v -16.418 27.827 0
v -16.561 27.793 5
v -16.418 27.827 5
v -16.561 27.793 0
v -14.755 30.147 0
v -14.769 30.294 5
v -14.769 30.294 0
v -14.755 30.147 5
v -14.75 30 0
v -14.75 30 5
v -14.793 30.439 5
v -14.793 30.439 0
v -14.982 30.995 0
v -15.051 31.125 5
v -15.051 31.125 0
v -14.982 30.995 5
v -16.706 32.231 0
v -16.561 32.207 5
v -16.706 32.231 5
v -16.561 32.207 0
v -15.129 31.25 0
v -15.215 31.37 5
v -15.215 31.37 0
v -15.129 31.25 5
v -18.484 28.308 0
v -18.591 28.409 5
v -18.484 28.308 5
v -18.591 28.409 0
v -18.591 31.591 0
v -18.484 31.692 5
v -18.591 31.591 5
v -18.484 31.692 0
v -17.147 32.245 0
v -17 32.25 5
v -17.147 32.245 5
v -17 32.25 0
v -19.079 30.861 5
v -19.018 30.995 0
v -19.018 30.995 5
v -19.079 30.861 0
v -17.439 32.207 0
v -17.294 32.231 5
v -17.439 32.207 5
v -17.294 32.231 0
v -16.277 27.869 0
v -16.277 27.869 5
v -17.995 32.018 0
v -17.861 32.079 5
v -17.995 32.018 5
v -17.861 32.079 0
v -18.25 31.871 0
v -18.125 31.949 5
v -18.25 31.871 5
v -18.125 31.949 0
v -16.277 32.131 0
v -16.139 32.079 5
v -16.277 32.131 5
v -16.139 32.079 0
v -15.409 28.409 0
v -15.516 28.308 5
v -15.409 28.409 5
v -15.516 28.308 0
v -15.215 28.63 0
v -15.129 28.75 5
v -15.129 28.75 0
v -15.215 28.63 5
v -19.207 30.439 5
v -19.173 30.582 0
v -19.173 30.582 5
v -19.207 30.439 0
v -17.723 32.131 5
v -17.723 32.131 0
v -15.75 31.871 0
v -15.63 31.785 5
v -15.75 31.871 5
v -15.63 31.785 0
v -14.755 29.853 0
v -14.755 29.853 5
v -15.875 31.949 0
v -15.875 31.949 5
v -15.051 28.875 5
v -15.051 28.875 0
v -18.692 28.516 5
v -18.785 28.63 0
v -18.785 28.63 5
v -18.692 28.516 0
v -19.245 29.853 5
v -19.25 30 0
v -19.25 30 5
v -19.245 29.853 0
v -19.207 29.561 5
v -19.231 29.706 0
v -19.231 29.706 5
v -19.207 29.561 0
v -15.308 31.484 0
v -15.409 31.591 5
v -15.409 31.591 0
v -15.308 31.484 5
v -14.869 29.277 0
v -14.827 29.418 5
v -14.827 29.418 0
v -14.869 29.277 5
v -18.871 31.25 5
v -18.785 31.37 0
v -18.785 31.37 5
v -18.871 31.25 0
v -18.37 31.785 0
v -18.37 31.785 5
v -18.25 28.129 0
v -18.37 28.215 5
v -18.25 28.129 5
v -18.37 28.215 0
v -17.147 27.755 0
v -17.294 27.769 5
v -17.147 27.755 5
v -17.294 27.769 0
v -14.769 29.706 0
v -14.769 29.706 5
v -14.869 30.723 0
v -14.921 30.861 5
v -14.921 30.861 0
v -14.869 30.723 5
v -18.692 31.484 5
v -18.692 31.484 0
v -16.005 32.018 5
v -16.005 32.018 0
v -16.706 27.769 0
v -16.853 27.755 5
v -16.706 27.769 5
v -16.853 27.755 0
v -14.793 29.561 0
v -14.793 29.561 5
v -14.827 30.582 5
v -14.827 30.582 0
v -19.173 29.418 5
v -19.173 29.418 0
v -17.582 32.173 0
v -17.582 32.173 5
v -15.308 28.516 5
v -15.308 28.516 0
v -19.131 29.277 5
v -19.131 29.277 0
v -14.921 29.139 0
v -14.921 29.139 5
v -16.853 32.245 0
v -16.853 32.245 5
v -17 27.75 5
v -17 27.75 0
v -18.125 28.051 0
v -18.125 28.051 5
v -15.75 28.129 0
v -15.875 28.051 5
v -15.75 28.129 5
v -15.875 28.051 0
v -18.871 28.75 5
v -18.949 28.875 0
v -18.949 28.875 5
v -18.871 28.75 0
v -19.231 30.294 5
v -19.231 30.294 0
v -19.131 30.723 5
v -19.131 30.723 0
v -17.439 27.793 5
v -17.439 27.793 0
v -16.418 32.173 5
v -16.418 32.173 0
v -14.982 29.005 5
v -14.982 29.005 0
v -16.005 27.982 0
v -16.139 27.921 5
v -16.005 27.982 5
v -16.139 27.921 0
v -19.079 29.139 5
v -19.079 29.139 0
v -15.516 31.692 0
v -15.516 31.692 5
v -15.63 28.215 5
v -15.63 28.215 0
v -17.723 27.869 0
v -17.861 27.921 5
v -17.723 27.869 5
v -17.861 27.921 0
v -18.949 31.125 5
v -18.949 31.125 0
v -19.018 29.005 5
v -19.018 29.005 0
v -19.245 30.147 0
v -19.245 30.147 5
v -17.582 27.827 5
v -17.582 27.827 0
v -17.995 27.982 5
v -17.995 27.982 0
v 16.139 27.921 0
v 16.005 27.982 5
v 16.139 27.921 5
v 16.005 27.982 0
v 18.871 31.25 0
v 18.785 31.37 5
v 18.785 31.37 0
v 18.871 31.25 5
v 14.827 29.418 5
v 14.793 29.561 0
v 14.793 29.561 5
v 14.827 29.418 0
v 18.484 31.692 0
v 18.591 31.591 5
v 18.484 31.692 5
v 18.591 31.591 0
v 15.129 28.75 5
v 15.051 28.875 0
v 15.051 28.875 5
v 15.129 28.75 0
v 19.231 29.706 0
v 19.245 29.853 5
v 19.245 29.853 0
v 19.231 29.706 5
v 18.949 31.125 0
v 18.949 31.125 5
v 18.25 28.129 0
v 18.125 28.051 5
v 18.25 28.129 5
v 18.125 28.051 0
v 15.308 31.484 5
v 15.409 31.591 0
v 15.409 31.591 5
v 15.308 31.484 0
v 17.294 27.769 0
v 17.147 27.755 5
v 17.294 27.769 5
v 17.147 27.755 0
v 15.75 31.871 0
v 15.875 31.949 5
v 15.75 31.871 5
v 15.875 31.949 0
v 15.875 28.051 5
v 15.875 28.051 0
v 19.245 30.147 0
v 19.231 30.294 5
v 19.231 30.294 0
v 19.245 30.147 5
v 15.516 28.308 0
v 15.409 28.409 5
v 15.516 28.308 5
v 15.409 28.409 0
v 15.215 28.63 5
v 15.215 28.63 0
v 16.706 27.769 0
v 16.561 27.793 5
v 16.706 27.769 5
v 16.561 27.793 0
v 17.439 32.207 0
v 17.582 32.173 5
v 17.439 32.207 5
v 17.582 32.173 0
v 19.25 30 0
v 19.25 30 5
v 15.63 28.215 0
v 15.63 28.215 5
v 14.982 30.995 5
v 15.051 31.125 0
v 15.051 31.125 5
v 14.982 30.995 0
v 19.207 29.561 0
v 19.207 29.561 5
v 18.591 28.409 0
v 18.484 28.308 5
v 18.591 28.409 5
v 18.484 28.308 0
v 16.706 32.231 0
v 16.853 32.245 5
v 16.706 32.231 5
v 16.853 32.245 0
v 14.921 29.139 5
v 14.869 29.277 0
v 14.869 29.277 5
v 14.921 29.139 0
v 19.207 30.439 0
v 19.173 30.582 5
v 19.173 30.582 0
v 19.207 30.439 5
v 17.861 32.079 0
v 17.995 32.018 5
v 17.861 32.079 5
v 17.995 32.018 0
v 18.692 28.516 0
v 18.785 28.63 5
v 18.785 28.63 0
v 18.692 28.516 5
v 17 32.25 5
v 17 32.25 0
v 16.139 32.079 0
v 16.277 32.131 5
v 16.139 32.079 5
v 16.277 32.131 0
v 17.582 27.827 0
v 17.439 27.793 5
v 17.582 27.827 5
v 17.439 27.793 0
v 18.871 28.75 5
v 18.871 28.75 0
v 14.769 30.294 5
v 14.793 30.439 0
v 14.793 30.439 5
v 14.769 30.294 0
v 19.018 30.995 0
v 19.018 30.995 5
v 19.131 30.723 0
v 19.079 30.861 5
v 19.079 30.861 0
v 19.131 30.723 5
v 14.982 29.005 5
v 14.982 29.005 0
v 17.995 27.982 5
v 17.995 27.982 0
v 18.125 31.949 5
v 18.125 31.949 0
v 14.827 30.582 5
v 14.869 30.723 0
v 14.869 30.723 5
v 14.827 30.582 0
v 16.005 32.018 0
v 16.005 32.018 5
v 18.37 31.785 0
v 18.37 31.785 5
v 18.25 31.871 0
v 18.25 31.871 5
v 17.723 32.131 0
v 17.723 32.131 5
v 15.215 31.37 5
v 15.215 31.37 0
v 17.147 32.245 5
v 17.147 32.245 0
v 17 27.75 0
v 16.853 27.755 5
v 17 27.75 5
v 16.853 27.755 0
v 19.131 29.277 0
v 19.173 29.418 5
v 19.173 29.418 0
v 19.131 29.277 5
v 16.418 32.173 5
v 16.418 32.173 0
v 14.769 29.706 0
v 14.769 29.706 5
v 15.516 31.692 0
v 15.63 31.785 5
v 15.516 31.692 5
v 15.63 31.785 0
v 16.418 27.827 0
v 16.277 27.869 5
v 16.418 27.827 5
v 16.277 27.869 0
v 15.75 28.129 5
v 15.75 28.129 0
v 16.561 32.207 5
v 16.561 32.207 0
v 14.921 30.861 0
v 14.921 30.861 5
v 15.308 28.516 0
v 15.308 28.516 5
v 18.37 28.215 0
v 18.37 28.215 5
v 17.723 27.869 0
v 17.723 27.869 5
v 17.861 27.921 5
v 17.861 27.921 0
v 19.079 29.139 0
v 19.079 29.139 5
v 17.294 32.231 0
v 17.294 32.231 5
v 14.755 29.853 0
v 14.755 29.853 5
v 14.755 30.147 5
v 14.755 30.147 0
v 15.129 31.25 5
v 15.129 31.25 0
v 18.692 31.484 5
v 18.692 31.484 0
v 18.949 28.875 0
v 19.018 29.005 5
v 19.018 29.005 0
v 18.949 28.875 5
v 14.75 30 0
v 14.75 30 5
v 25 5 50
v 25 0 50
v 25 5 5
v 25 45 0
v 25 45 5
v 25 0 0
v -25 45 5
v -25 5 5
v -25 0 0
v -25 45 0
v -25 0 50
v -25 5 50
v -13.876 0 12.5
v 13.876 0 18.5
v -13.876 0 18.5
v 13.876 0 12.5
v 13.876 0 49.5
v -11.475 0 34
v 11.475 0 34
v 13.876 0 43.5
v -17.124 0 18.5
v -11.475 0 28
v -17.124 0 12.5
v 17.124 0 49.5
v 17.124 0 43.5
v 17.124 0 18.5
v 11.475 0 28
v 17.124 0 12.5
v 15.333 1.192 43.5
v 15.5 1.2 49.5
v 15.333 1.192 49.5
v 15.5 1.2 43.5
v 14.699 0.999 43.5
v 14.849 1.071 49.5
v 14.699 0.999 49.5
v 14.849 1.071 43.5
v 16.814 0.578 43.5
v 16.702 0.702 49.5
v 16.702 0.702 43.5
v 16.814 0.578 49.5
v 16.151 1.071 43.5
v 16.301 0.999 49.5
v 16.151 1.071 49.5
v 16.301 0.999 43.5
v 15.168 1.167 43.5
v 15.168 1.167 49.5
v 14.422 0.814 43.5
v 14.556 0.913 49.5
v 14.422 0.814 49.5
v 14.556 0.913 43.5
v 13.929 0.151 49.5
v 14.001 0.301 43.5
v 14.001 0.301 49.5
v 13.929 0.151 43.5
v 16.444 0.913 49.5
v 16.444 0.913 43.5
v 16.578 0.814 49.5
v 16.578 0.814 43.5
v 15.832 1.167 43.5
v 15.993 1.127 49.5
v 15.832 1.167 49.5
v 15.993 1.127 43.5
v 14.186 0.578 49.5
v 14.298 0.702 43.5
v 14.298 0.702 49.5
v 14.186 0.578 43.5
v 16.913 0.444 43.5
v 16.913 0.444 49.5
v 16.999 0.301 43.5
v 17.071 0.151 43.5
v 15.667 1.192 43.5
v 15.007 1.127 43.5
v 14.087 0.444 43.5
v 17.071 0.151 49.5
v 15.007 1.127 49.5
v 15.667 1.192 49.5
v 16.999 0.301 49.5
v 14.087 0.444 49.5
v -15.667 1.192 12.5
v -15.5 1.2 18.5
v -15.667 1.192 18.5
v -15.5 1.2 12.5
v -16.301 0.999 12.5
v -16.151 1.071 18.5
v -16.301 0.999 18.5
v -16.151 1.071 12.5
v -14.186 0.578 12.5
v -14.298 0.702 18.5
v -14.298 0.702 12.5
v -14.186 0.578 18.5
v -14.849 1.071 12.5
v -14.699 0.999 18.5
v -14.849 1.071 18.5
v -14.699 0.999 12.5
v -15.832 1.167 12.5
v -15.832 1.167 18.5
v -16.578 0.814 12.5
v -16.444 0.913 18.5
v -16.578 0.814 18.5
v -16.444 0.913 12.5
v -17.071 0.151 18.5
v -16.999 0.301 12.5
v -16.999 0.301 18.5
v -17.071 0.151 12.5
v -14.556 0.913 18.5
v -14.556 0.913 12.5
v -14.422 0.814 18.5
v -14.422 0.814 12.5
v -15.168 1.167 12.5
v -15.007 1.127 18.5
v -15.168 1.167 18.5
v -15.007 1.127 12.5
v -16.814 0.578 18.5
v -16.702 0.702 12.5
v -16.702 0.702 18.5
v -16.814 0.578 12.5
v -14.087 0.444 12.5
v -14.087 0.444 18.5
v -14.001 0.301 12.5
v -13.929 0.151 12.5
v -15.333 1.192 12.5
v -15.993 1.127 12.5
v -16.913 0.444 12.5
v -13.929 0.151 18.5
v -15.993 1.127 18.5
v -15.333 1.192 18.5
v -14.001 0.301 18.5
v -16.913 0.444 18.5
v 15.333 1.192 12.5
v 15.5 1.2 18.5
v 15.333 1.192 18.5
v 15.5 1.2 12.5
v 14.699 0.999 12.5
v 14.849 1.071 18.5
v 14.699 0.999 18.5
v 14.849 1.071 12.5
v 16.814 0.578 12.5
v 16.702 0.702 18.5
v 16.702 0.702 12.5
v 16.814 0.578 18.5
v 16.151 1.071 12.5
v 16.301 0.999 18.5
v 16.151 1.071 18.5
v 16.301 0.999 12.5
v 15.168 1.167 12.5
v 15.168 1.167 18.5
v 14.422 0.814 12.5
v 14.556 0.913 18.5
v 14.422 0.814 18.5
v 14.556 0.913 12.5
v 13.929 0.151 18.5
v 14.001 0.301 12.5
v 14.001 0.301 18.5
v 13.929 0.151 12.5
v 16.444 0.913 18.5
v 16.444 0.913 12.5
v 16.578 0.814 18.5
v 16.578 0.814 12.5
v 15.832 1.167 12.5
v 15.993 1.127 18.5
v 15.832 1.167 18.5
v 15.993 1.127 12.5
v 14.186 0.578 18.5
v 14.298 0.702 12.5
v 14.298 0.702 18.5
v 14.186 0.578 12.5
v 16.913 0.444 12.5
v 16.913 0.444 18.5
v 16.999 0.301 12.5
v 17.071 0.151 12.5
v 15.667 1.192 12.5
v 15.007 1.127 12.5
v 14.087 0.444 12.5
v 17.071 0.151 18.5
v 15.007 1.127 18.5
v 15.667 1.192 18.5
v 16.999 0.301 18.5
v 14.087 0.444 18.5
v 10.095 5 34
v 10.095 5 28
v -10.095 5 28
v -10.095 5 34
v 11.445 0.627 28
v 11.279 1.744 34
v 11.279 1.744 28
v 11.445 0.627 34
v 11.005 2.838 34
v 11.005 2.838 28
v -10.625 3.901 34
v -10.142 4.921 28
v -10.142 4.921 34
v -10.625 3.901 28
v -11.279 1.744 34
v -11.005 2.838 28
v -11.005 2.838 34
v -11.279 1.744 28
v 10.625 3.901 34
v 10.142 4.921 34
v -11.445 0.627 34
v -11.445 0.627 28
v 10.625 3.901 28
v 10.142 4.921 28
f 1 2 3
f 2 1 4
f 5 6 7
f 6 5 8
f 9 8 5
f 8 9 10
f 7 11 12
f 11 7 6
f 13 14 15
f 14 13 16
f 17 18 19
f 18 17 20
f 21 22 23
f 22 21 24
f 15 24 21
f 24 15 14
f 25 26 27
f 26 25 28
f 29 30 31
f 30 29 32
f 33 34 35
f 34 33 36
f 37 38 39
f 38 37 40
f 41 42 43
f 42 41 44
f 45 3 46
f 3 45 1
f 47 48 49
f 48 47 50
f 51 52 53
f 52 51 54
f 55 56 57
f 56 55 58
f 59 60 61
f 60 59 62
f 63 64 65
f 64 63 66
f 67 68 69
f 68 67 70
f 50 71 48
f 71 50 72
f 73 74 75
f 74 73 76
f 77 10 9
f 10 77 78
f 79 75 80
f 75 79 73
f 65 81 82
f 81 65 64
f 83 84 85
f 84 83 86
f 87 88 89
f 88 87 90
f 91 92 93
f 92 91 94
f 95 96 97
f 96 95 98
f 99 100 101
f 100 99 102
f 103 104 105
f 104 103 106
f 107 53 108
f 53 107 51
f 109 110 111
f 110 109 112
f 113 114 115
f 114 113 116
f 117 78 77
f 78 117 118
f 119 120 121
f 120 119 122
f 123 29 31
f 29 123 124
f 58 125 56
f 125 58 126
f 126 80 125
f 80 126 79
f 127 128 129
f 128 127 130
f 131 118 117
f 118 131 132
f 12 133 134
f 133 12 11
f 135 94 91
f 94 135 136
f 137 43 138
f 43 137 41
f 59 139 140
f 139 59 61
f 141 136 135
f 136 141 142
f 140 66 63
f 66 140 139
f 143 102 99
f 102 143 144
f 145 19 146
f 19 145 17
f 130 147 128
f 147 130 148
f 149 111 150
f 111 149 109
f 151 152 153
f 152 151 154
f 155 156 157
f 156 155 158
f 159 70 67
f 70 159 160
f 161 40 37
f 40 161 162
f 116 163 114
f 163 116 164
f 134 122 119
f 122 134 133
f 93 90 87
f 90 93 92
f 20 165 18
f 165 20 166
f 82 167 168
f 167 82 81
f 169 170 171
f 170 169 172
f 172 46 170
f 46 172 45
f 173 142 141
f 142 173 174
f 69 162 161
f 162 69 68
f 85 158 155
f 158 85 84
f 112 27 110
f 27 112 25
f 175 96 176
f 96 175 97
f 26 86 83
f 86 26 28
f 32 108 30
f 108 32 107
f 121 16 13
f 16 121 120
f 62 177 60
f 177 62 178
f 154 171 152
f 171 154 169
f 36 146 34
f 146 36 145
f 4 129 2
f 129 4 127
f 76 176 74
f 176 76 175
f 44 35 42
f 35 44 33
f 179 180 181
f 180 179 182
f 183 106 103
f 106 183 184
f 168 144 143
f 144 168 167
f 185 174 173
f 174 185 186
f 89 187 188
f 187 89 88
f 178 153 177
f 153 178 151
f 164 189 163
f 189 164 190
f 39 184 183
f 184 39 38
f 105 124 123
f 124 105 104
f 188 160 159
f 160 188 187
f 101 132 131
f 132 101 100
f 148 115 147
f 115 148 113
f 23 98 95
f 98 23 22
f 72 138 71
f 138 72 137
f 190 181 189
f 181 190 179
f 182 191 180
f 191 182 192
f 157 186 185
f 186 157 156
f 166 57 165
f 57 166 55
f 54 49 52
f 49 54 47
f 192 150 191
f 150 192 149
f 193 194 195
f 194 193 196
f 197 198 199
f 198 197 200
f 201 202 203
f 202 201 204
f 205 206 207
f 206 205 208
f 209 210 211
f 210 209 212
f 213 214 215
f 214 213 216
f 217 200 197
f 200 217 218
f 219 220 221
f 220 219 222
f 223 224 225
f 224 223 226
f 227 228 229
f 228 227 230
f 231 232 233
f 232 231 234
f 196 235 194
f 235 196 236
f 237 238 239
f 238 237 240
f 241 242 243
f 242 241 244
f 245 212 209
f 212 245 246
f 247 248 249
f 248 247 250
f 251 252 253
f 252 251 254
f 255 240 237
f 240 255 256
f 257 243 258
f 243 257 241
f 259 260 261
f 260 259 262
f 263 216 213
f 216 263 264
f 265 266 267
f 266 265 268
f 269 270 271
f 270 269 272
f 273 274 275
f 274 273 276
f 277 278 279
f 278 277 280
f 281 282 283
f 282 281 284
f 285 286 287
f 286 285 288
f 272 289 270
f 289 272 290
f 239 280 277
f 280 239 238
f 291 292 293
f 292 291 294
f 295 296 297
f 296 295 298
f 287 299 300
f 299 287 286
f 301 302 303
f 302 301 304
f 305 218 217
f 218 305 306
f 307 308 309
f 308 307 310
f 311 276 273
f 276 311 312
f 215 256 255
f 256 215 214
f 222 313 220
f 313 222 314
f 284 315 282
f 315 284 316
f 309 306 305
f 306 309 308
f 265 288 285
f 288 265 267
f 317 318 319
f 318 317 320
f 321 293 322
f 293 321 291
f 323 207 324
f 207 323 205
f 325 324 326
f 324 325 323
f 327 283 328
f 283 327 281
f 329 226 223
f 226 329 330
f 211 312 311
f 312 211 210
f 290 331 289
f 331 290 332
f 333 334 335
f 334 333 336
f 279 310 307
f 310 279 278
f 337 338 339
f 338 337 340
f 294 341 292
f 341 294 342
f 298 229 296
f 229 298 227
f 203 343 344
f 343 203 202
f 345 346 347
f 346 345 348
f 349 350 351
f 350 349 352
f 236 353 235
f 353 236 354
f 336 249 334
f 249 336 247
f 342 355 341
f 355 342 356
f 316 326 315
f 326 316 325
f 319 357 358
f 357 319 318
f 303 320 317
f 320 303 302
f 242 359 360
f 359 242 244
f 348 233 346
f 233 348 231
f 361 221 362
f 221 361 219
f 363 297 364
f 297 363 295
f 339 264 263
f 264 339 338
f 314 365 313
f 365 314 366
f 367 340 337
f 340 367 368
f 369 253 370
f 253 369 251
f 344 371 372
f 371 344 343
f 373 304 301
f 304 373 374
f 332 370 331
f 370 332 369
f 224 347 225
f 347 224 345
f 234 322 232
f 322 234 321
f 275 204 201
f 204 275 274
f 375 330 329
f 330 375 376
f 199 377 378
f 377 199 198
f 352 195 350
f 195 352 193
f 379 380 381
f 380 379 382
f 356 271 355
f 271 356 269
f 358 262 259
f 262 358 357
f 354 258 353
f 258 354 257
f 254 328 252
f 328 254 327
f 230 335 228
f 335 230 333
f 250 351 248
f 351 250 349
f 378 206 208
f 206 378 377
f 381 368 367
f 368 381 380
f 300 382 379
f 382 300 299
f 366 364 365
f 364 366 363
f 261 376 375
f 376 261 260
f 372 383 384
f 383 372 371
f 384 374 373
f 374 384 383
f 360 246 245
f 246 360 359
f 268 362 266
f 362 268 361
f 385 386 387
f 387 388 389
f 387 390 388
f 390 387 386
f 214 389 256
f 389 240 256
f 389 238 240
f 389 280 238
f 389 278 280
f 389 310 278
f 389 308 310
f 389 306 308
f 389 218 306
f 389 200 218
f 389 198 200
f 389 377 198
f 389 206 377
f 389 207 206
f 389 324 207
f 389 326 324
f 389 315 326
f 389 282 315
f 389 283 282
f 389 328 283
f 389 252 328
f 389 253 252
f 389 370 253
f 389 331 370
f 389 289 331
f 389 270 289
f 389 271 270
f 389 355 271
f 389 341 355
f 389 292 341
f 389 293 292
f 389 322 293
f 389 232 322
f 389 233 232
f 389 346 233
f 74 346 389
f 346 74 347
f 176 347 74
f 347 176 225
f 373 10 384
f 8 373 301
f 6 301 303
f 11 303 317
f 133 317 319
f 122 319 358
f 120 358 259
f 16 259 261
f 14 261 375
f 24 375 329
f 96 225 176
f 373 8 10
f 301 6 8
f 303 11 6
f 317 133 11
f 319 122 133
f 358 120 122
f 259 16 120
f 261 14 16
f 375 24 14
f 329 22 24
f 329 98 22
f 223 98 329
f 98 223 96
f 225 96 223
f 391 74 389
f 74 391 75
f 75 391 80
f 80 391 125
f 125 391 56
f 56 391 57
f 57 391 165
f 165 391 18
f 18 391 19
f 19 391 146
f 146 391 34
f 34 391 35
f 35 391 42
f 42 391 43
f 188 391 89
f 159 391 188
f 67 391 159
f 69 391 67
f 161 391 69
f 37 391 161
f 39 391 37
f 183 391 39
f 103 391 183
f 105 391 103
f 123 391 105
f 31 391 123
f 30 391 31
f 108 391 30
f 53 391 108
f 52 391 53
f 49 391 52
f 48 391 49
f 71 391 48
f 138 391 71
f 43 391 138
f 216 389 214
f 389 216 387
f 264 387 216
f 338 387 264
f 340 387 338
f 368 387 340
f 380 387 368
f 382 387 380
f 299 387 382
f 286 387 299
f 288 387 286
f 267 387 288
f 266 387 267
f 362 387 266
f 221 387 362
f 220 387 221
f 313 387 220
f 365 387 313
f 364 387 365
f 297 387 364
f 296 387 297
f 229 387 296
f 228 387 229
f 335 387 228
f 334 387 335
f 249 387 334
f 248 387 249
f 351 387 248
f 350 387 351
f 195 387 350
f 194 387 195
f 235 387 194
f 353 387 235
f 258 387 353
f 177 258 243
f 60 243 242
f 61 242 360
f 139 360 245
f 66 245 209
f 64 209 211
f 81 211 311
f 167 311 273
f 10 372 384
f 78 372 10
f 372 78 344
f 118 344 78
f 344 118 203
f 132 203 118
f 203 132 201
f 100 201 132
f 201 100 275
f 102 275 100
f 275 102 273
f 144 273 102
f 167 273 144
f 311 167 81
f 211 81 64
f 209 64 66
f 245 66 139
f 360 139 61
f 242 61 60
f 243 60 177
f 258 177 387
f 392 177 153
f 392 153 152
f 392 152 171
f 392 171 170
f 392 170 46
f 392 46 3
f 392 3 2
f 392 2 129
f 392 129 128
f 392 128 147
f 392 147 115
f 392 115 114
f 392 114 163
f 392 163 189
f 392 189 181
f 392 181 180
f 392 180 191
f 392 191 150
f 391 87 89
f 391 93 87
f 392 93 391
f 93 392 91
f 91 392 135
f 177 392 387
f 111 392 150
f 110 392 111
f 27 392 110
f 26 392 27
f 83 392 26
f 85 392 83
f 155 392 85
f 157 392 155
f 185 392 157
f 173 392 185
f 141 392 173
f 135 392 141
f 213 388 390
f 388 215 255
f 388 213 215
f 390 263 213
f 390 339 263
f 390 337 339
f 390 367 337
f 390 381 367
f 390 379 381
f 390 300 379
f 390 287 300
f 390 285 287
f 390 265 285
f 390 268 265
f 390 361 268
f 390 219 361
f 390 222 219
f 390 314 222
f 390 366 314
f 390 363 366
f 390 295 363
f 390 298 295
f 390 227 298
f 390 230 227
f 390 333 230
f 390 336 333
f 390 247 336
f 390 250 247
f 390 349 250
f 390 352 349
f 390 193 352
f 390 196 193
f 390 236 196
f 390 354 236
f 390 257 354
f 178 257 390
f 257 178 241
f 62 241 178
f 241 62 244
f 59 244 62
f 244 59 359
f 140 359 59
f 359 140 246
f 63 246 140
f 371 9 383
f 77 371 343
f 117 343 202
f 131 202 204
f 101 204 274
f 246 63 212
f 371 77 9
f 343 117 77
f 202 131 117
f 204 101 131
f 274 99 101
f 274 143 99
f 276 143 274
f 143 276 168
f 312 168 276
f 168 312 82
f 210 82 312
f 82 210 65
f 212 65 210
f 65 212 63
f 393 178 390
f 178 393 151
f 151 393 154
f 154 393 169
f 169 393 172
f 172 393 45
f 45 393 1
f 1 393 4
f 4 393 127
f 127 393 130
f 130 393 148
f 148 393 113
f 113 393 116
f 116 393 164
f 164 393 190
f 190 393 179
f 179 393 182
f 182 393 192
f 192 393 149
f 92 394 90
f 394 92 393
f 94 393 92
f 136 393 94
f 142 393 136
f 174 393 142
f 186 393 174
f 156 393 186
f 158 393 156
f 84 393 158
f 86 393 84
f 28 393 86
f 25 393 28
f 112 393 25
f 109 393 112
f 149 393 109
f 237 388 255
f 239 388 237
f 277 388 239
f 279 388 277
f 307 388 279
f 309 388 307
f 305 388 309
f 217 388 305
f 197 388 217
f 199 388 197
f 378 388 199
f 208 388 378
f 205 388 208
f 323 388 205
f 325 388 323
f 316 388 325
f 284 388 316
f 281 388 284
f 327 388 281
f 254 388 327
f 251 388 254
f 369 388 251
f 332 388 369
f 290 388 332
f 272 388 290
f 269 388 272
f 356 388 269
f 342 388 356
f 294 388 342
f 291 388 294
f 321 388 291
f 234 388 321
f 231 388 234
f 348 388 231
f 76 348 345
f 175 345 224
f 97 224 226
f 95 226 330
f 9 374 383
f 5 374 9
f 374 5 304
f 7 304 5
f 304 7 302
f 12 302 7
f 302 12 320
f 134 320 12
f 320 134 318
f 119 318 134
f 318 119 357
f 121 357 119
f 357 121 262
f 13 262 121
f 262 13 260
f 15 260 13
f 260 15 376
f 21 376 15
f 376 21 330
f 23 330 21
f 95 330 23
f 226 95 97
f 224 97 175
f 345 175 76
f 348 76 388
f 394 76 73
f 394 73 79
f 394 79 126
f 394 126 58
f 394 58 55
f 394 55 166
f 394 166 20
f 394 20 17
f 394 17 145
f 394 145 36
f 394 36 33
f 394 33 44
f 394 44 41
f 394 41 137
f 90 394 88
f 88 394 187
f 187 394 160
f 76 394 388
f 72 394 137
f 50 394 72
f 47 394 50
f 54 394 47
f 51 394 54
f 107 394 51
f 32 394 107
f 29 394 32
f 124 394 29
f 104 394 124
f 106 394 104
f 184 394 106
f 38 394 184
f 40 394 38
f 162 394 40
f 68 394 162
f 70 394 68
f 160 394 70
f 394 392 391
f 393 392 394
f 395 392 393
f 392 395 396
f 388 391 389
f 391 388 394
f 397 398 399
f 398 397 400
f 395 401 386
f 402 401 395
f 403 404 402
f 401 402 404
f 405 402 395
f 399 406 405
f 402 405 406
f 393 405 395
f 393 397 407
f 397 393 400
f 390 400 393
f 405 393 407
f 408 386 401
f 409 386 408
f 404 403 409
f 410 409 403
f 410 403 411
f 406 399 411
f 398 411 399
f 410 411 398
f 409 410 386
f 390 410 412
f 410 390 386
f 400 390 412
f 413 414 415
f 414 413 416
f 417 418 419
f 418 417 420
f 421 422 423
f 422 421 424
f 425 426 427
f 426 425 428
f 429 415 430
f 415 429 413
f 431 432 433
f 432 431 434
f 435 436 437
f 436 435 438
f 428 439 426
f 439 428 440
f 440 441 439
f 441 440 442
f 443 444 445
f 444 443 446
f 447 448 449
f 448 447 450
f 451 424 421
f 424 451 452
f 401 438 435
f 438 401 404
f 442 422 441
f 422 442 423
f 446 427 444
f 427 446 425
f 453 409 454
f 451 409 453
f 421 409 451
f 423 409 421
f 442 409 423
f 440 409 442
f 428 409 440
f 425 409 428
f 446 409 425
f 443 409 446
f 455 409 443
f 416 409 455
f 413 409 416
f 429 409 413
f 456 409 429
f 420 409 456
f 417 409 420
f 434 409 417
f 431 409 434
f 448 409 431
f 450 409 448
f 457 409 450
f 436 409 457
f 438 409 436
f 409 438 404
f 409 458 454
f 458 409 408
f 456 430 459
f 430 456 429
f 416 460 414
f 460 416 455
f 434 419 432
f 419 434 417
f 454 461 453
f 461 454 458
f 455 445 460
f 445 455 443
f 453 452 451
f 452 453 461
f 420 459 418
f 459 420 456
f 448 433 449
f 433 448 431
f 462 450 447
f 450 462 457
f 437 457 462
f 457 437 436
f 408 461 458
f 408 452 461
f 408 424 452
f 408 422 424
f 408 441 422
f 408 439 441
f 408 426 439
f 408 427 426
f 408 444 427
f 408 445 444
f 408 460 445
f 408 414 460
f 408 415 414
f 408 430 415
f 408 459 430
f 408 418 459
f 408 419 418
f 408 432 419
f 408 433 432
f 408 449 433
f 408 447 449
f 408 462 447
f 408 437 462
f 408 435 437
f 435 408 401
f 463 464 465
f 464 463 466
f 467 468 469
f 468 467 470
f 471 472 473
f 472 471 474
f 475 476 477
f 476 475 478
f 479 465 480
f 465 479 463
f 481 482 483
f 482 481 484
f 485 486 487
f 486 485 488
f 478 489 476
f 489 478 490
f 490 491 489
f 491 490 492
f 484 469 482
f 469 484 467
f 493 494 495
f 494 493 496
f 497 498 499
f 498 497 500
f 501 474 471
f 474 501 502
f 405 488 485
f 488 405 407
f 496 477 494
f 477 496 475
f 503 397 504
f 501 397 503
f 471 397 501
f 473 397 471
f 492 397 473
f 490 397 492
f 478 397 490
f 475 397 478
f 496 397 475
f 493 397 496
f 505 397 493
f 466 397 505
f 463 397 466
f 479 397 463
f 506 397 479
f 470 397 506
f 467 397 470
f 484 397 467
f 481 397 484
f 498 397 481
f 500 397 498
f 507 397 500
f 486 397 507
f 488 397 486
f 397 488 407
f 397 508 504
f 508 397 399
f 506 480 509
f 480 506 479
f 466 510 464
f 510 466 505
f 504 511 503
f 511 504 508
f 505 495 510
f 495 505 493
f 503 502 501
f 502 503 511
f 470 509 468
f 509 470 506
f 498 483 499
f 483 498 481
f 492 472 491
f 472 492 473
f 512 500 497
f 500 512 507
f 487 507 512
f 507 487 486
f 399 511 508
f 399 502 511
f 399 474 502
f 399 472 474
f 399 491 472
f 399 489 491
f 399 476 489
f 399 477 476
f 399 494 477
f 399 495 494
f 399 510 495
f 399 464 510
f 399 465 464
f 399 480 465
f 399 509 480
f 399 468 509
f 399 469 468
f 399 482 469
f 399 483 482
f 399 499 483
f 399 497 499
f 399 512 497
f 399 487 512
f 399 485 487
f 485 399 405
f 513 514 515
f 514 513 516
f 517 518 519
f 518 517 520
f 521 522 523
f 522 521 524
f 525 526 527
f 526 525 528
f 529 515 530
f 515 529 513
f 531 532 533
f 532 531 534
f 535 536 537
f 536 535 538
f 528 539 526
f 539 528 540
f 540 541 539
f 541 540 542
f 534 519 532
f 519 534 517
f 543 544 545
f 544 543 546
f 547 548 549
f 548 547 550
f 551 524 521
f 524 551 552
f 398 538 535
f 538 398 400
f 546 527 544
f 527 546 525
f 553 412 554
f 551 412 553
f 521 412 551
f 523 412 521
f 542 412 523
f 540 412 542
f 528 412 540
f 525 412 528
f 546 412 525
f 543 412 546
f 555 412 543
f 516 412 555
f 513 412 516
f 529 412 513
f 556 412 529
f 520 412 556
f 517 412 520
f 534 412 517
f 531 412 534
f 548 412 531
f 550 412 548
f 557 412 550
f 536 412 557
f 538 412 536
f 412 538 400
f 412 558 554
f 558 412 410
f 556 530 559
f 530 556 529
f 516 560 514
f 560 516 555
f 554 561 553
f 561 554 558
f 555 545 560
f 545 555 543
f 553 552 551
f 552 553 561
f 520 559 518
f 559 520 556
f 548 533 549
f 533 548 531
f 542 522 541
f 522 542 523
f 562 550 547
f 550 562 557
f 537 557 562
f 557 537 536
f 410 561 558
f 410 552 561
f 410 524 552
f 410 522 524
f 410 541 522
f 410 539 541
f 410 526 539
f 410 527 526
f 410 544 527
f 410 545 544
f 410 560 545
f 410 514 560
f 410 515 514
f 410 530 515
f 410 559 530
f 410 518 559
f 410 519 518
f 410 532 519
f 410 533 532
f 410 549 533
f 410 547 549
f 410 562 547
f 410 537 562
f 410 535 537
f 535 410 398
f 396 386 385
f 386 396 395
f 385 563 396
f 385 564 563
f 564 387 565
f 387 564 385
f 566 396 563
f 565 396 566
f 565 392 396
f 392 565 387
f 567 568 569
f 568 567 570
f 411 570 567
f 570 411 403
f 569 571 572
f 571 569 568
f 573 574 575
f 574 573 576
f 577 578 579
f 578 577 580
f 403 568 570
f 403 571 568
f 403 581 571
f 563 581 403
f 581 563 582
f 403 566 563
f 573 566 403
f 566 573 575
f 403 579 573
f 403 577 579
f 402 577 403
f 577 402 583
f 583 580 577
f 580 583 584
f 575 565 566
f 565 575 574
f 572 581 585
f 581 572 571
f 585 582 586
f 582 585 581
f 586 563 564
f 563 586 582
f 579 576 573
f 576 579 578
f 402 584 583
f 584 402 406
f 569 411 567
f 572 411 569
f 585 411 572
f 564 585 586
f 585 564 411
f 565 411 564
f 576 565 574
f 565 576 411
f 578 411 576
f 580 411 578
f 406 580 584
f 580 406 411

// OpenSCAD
// L-shaped mounting bracket for NEMA 17 stepper motor (syringe pump)
// Print orientation: base plate on bed, vertical motor plate builds up +Z

// ---------------- Parameters ----------------
base_x0      = -25;   // base plate x start
base_x1      = 25;    // base plate x end
base_y0      = 0;     // base plate y start
base_y1      = 45;    // base plate y end
base_z0      = 0;     // base plate z start
base_z1      = 5;     // base plate z end

motor_plate_x0 = -25;  // motor plate x start (same as base)
motor_plate_x1 = 25;   // motor plate x end (same as base)
motor_plate_y0 = 0;    // motor plate y start (same as base)
motor_plate_y1 = 5;    // motor plate y end (back edge of base)
motor_plate_z0 = 0;    // motor plate z start (same as base)
motor_plate_z1 = 50;   // motor plate z end (top)

boss_d       = 23;     // motor centring boss hole diameter
boss_x       = 0;      // boss hole centre x
boss_z       = 28;     // boss hole centre z

screw_d      = 3.4;    // M3 screw hole diameter
screw_n      = 4;      // number of screw holes
screw_pitch  = 31;     // square pattern side length

gusset_t     = 5;      // gusset thickness (along X)
gusset_leg   = 20;     // right triangle legs along +Y and +Z
gusset_x0    = -25;    // gusset x start (left edge)
gusset_x1    = -20;    // gusset x end (left gusset)
gusset_x2    = 20;     // right gusset x start
gusset_x3    = 25;     // right gusset x end

eps          = 0.5;    // cutter overshoot past faces
$fn          = 96;     // curve resolution

// ---------------- Model ----------------
union() {
    // Base plate with two vertical through-holes (M4)
    difference() {
        translate([base_x0, base_y0, base_z0])
            cube([base_x1 - base_x0, base_y1 - base_y0, base_z1 - base_z0]);
        for (sx = [-17, 17])
            translate([sx, base_y1 - 15, -eps])
                cylinder(d = 4.5, h = base_z1 - base_z0 + 2 * eps);
    }

    // Vertical motor plate with boss hole and four M3 screw holes
    difference() {
        translate([motor_plate_x0, motor_plate_y0, motor_plate_z0])
            cube([motor_plate_x1 - motor_plate_x0,
                  motor_plate_y1 - motor_plate_y0,
                  motor_plate_z1 - motor_plate_z0]);
        // Boss hole along Y
        translate([boss_x, -eps, boss_z])
            cylinder(d = boss_d, h = motor_plate_y1 - motor_plate_y0 + 2 * eps, $fn = 64);
        // Screw holes on 31 mm square pattern, centred on boss hole
        for (i = [0 : screw_n - 1]) {
            a = screw_pitch / 2;
            x = boss_x + a * (i % 2 == 0 ? 1 : -1);
            z = boss_z + a * (i / 2 == 0 ? 1 : -1);
            translate([x, -eps, z])
                cylinder(d = screw_d, h = motor_plate_y1 - motor_plate_y0 + 2 * eps, $fn = 64);
        }
    }

    // Gussets flush with left and right edges
    for (gx = [gusset_x0, gusset_x2]) {
        translate([gx, 0, 0])
            linear_extrude(gusset_x1 - gx + eps)
                // right triangle in YZ plane: legs along +Y and +Z,
                // right-angle corner at y = 5, z = 5 (where the plates meet)
                translate([0, gusset_leg, gusset_leg])
                    cube([gusset_leg, gusset_t, gusset_leg]);
    }
}
